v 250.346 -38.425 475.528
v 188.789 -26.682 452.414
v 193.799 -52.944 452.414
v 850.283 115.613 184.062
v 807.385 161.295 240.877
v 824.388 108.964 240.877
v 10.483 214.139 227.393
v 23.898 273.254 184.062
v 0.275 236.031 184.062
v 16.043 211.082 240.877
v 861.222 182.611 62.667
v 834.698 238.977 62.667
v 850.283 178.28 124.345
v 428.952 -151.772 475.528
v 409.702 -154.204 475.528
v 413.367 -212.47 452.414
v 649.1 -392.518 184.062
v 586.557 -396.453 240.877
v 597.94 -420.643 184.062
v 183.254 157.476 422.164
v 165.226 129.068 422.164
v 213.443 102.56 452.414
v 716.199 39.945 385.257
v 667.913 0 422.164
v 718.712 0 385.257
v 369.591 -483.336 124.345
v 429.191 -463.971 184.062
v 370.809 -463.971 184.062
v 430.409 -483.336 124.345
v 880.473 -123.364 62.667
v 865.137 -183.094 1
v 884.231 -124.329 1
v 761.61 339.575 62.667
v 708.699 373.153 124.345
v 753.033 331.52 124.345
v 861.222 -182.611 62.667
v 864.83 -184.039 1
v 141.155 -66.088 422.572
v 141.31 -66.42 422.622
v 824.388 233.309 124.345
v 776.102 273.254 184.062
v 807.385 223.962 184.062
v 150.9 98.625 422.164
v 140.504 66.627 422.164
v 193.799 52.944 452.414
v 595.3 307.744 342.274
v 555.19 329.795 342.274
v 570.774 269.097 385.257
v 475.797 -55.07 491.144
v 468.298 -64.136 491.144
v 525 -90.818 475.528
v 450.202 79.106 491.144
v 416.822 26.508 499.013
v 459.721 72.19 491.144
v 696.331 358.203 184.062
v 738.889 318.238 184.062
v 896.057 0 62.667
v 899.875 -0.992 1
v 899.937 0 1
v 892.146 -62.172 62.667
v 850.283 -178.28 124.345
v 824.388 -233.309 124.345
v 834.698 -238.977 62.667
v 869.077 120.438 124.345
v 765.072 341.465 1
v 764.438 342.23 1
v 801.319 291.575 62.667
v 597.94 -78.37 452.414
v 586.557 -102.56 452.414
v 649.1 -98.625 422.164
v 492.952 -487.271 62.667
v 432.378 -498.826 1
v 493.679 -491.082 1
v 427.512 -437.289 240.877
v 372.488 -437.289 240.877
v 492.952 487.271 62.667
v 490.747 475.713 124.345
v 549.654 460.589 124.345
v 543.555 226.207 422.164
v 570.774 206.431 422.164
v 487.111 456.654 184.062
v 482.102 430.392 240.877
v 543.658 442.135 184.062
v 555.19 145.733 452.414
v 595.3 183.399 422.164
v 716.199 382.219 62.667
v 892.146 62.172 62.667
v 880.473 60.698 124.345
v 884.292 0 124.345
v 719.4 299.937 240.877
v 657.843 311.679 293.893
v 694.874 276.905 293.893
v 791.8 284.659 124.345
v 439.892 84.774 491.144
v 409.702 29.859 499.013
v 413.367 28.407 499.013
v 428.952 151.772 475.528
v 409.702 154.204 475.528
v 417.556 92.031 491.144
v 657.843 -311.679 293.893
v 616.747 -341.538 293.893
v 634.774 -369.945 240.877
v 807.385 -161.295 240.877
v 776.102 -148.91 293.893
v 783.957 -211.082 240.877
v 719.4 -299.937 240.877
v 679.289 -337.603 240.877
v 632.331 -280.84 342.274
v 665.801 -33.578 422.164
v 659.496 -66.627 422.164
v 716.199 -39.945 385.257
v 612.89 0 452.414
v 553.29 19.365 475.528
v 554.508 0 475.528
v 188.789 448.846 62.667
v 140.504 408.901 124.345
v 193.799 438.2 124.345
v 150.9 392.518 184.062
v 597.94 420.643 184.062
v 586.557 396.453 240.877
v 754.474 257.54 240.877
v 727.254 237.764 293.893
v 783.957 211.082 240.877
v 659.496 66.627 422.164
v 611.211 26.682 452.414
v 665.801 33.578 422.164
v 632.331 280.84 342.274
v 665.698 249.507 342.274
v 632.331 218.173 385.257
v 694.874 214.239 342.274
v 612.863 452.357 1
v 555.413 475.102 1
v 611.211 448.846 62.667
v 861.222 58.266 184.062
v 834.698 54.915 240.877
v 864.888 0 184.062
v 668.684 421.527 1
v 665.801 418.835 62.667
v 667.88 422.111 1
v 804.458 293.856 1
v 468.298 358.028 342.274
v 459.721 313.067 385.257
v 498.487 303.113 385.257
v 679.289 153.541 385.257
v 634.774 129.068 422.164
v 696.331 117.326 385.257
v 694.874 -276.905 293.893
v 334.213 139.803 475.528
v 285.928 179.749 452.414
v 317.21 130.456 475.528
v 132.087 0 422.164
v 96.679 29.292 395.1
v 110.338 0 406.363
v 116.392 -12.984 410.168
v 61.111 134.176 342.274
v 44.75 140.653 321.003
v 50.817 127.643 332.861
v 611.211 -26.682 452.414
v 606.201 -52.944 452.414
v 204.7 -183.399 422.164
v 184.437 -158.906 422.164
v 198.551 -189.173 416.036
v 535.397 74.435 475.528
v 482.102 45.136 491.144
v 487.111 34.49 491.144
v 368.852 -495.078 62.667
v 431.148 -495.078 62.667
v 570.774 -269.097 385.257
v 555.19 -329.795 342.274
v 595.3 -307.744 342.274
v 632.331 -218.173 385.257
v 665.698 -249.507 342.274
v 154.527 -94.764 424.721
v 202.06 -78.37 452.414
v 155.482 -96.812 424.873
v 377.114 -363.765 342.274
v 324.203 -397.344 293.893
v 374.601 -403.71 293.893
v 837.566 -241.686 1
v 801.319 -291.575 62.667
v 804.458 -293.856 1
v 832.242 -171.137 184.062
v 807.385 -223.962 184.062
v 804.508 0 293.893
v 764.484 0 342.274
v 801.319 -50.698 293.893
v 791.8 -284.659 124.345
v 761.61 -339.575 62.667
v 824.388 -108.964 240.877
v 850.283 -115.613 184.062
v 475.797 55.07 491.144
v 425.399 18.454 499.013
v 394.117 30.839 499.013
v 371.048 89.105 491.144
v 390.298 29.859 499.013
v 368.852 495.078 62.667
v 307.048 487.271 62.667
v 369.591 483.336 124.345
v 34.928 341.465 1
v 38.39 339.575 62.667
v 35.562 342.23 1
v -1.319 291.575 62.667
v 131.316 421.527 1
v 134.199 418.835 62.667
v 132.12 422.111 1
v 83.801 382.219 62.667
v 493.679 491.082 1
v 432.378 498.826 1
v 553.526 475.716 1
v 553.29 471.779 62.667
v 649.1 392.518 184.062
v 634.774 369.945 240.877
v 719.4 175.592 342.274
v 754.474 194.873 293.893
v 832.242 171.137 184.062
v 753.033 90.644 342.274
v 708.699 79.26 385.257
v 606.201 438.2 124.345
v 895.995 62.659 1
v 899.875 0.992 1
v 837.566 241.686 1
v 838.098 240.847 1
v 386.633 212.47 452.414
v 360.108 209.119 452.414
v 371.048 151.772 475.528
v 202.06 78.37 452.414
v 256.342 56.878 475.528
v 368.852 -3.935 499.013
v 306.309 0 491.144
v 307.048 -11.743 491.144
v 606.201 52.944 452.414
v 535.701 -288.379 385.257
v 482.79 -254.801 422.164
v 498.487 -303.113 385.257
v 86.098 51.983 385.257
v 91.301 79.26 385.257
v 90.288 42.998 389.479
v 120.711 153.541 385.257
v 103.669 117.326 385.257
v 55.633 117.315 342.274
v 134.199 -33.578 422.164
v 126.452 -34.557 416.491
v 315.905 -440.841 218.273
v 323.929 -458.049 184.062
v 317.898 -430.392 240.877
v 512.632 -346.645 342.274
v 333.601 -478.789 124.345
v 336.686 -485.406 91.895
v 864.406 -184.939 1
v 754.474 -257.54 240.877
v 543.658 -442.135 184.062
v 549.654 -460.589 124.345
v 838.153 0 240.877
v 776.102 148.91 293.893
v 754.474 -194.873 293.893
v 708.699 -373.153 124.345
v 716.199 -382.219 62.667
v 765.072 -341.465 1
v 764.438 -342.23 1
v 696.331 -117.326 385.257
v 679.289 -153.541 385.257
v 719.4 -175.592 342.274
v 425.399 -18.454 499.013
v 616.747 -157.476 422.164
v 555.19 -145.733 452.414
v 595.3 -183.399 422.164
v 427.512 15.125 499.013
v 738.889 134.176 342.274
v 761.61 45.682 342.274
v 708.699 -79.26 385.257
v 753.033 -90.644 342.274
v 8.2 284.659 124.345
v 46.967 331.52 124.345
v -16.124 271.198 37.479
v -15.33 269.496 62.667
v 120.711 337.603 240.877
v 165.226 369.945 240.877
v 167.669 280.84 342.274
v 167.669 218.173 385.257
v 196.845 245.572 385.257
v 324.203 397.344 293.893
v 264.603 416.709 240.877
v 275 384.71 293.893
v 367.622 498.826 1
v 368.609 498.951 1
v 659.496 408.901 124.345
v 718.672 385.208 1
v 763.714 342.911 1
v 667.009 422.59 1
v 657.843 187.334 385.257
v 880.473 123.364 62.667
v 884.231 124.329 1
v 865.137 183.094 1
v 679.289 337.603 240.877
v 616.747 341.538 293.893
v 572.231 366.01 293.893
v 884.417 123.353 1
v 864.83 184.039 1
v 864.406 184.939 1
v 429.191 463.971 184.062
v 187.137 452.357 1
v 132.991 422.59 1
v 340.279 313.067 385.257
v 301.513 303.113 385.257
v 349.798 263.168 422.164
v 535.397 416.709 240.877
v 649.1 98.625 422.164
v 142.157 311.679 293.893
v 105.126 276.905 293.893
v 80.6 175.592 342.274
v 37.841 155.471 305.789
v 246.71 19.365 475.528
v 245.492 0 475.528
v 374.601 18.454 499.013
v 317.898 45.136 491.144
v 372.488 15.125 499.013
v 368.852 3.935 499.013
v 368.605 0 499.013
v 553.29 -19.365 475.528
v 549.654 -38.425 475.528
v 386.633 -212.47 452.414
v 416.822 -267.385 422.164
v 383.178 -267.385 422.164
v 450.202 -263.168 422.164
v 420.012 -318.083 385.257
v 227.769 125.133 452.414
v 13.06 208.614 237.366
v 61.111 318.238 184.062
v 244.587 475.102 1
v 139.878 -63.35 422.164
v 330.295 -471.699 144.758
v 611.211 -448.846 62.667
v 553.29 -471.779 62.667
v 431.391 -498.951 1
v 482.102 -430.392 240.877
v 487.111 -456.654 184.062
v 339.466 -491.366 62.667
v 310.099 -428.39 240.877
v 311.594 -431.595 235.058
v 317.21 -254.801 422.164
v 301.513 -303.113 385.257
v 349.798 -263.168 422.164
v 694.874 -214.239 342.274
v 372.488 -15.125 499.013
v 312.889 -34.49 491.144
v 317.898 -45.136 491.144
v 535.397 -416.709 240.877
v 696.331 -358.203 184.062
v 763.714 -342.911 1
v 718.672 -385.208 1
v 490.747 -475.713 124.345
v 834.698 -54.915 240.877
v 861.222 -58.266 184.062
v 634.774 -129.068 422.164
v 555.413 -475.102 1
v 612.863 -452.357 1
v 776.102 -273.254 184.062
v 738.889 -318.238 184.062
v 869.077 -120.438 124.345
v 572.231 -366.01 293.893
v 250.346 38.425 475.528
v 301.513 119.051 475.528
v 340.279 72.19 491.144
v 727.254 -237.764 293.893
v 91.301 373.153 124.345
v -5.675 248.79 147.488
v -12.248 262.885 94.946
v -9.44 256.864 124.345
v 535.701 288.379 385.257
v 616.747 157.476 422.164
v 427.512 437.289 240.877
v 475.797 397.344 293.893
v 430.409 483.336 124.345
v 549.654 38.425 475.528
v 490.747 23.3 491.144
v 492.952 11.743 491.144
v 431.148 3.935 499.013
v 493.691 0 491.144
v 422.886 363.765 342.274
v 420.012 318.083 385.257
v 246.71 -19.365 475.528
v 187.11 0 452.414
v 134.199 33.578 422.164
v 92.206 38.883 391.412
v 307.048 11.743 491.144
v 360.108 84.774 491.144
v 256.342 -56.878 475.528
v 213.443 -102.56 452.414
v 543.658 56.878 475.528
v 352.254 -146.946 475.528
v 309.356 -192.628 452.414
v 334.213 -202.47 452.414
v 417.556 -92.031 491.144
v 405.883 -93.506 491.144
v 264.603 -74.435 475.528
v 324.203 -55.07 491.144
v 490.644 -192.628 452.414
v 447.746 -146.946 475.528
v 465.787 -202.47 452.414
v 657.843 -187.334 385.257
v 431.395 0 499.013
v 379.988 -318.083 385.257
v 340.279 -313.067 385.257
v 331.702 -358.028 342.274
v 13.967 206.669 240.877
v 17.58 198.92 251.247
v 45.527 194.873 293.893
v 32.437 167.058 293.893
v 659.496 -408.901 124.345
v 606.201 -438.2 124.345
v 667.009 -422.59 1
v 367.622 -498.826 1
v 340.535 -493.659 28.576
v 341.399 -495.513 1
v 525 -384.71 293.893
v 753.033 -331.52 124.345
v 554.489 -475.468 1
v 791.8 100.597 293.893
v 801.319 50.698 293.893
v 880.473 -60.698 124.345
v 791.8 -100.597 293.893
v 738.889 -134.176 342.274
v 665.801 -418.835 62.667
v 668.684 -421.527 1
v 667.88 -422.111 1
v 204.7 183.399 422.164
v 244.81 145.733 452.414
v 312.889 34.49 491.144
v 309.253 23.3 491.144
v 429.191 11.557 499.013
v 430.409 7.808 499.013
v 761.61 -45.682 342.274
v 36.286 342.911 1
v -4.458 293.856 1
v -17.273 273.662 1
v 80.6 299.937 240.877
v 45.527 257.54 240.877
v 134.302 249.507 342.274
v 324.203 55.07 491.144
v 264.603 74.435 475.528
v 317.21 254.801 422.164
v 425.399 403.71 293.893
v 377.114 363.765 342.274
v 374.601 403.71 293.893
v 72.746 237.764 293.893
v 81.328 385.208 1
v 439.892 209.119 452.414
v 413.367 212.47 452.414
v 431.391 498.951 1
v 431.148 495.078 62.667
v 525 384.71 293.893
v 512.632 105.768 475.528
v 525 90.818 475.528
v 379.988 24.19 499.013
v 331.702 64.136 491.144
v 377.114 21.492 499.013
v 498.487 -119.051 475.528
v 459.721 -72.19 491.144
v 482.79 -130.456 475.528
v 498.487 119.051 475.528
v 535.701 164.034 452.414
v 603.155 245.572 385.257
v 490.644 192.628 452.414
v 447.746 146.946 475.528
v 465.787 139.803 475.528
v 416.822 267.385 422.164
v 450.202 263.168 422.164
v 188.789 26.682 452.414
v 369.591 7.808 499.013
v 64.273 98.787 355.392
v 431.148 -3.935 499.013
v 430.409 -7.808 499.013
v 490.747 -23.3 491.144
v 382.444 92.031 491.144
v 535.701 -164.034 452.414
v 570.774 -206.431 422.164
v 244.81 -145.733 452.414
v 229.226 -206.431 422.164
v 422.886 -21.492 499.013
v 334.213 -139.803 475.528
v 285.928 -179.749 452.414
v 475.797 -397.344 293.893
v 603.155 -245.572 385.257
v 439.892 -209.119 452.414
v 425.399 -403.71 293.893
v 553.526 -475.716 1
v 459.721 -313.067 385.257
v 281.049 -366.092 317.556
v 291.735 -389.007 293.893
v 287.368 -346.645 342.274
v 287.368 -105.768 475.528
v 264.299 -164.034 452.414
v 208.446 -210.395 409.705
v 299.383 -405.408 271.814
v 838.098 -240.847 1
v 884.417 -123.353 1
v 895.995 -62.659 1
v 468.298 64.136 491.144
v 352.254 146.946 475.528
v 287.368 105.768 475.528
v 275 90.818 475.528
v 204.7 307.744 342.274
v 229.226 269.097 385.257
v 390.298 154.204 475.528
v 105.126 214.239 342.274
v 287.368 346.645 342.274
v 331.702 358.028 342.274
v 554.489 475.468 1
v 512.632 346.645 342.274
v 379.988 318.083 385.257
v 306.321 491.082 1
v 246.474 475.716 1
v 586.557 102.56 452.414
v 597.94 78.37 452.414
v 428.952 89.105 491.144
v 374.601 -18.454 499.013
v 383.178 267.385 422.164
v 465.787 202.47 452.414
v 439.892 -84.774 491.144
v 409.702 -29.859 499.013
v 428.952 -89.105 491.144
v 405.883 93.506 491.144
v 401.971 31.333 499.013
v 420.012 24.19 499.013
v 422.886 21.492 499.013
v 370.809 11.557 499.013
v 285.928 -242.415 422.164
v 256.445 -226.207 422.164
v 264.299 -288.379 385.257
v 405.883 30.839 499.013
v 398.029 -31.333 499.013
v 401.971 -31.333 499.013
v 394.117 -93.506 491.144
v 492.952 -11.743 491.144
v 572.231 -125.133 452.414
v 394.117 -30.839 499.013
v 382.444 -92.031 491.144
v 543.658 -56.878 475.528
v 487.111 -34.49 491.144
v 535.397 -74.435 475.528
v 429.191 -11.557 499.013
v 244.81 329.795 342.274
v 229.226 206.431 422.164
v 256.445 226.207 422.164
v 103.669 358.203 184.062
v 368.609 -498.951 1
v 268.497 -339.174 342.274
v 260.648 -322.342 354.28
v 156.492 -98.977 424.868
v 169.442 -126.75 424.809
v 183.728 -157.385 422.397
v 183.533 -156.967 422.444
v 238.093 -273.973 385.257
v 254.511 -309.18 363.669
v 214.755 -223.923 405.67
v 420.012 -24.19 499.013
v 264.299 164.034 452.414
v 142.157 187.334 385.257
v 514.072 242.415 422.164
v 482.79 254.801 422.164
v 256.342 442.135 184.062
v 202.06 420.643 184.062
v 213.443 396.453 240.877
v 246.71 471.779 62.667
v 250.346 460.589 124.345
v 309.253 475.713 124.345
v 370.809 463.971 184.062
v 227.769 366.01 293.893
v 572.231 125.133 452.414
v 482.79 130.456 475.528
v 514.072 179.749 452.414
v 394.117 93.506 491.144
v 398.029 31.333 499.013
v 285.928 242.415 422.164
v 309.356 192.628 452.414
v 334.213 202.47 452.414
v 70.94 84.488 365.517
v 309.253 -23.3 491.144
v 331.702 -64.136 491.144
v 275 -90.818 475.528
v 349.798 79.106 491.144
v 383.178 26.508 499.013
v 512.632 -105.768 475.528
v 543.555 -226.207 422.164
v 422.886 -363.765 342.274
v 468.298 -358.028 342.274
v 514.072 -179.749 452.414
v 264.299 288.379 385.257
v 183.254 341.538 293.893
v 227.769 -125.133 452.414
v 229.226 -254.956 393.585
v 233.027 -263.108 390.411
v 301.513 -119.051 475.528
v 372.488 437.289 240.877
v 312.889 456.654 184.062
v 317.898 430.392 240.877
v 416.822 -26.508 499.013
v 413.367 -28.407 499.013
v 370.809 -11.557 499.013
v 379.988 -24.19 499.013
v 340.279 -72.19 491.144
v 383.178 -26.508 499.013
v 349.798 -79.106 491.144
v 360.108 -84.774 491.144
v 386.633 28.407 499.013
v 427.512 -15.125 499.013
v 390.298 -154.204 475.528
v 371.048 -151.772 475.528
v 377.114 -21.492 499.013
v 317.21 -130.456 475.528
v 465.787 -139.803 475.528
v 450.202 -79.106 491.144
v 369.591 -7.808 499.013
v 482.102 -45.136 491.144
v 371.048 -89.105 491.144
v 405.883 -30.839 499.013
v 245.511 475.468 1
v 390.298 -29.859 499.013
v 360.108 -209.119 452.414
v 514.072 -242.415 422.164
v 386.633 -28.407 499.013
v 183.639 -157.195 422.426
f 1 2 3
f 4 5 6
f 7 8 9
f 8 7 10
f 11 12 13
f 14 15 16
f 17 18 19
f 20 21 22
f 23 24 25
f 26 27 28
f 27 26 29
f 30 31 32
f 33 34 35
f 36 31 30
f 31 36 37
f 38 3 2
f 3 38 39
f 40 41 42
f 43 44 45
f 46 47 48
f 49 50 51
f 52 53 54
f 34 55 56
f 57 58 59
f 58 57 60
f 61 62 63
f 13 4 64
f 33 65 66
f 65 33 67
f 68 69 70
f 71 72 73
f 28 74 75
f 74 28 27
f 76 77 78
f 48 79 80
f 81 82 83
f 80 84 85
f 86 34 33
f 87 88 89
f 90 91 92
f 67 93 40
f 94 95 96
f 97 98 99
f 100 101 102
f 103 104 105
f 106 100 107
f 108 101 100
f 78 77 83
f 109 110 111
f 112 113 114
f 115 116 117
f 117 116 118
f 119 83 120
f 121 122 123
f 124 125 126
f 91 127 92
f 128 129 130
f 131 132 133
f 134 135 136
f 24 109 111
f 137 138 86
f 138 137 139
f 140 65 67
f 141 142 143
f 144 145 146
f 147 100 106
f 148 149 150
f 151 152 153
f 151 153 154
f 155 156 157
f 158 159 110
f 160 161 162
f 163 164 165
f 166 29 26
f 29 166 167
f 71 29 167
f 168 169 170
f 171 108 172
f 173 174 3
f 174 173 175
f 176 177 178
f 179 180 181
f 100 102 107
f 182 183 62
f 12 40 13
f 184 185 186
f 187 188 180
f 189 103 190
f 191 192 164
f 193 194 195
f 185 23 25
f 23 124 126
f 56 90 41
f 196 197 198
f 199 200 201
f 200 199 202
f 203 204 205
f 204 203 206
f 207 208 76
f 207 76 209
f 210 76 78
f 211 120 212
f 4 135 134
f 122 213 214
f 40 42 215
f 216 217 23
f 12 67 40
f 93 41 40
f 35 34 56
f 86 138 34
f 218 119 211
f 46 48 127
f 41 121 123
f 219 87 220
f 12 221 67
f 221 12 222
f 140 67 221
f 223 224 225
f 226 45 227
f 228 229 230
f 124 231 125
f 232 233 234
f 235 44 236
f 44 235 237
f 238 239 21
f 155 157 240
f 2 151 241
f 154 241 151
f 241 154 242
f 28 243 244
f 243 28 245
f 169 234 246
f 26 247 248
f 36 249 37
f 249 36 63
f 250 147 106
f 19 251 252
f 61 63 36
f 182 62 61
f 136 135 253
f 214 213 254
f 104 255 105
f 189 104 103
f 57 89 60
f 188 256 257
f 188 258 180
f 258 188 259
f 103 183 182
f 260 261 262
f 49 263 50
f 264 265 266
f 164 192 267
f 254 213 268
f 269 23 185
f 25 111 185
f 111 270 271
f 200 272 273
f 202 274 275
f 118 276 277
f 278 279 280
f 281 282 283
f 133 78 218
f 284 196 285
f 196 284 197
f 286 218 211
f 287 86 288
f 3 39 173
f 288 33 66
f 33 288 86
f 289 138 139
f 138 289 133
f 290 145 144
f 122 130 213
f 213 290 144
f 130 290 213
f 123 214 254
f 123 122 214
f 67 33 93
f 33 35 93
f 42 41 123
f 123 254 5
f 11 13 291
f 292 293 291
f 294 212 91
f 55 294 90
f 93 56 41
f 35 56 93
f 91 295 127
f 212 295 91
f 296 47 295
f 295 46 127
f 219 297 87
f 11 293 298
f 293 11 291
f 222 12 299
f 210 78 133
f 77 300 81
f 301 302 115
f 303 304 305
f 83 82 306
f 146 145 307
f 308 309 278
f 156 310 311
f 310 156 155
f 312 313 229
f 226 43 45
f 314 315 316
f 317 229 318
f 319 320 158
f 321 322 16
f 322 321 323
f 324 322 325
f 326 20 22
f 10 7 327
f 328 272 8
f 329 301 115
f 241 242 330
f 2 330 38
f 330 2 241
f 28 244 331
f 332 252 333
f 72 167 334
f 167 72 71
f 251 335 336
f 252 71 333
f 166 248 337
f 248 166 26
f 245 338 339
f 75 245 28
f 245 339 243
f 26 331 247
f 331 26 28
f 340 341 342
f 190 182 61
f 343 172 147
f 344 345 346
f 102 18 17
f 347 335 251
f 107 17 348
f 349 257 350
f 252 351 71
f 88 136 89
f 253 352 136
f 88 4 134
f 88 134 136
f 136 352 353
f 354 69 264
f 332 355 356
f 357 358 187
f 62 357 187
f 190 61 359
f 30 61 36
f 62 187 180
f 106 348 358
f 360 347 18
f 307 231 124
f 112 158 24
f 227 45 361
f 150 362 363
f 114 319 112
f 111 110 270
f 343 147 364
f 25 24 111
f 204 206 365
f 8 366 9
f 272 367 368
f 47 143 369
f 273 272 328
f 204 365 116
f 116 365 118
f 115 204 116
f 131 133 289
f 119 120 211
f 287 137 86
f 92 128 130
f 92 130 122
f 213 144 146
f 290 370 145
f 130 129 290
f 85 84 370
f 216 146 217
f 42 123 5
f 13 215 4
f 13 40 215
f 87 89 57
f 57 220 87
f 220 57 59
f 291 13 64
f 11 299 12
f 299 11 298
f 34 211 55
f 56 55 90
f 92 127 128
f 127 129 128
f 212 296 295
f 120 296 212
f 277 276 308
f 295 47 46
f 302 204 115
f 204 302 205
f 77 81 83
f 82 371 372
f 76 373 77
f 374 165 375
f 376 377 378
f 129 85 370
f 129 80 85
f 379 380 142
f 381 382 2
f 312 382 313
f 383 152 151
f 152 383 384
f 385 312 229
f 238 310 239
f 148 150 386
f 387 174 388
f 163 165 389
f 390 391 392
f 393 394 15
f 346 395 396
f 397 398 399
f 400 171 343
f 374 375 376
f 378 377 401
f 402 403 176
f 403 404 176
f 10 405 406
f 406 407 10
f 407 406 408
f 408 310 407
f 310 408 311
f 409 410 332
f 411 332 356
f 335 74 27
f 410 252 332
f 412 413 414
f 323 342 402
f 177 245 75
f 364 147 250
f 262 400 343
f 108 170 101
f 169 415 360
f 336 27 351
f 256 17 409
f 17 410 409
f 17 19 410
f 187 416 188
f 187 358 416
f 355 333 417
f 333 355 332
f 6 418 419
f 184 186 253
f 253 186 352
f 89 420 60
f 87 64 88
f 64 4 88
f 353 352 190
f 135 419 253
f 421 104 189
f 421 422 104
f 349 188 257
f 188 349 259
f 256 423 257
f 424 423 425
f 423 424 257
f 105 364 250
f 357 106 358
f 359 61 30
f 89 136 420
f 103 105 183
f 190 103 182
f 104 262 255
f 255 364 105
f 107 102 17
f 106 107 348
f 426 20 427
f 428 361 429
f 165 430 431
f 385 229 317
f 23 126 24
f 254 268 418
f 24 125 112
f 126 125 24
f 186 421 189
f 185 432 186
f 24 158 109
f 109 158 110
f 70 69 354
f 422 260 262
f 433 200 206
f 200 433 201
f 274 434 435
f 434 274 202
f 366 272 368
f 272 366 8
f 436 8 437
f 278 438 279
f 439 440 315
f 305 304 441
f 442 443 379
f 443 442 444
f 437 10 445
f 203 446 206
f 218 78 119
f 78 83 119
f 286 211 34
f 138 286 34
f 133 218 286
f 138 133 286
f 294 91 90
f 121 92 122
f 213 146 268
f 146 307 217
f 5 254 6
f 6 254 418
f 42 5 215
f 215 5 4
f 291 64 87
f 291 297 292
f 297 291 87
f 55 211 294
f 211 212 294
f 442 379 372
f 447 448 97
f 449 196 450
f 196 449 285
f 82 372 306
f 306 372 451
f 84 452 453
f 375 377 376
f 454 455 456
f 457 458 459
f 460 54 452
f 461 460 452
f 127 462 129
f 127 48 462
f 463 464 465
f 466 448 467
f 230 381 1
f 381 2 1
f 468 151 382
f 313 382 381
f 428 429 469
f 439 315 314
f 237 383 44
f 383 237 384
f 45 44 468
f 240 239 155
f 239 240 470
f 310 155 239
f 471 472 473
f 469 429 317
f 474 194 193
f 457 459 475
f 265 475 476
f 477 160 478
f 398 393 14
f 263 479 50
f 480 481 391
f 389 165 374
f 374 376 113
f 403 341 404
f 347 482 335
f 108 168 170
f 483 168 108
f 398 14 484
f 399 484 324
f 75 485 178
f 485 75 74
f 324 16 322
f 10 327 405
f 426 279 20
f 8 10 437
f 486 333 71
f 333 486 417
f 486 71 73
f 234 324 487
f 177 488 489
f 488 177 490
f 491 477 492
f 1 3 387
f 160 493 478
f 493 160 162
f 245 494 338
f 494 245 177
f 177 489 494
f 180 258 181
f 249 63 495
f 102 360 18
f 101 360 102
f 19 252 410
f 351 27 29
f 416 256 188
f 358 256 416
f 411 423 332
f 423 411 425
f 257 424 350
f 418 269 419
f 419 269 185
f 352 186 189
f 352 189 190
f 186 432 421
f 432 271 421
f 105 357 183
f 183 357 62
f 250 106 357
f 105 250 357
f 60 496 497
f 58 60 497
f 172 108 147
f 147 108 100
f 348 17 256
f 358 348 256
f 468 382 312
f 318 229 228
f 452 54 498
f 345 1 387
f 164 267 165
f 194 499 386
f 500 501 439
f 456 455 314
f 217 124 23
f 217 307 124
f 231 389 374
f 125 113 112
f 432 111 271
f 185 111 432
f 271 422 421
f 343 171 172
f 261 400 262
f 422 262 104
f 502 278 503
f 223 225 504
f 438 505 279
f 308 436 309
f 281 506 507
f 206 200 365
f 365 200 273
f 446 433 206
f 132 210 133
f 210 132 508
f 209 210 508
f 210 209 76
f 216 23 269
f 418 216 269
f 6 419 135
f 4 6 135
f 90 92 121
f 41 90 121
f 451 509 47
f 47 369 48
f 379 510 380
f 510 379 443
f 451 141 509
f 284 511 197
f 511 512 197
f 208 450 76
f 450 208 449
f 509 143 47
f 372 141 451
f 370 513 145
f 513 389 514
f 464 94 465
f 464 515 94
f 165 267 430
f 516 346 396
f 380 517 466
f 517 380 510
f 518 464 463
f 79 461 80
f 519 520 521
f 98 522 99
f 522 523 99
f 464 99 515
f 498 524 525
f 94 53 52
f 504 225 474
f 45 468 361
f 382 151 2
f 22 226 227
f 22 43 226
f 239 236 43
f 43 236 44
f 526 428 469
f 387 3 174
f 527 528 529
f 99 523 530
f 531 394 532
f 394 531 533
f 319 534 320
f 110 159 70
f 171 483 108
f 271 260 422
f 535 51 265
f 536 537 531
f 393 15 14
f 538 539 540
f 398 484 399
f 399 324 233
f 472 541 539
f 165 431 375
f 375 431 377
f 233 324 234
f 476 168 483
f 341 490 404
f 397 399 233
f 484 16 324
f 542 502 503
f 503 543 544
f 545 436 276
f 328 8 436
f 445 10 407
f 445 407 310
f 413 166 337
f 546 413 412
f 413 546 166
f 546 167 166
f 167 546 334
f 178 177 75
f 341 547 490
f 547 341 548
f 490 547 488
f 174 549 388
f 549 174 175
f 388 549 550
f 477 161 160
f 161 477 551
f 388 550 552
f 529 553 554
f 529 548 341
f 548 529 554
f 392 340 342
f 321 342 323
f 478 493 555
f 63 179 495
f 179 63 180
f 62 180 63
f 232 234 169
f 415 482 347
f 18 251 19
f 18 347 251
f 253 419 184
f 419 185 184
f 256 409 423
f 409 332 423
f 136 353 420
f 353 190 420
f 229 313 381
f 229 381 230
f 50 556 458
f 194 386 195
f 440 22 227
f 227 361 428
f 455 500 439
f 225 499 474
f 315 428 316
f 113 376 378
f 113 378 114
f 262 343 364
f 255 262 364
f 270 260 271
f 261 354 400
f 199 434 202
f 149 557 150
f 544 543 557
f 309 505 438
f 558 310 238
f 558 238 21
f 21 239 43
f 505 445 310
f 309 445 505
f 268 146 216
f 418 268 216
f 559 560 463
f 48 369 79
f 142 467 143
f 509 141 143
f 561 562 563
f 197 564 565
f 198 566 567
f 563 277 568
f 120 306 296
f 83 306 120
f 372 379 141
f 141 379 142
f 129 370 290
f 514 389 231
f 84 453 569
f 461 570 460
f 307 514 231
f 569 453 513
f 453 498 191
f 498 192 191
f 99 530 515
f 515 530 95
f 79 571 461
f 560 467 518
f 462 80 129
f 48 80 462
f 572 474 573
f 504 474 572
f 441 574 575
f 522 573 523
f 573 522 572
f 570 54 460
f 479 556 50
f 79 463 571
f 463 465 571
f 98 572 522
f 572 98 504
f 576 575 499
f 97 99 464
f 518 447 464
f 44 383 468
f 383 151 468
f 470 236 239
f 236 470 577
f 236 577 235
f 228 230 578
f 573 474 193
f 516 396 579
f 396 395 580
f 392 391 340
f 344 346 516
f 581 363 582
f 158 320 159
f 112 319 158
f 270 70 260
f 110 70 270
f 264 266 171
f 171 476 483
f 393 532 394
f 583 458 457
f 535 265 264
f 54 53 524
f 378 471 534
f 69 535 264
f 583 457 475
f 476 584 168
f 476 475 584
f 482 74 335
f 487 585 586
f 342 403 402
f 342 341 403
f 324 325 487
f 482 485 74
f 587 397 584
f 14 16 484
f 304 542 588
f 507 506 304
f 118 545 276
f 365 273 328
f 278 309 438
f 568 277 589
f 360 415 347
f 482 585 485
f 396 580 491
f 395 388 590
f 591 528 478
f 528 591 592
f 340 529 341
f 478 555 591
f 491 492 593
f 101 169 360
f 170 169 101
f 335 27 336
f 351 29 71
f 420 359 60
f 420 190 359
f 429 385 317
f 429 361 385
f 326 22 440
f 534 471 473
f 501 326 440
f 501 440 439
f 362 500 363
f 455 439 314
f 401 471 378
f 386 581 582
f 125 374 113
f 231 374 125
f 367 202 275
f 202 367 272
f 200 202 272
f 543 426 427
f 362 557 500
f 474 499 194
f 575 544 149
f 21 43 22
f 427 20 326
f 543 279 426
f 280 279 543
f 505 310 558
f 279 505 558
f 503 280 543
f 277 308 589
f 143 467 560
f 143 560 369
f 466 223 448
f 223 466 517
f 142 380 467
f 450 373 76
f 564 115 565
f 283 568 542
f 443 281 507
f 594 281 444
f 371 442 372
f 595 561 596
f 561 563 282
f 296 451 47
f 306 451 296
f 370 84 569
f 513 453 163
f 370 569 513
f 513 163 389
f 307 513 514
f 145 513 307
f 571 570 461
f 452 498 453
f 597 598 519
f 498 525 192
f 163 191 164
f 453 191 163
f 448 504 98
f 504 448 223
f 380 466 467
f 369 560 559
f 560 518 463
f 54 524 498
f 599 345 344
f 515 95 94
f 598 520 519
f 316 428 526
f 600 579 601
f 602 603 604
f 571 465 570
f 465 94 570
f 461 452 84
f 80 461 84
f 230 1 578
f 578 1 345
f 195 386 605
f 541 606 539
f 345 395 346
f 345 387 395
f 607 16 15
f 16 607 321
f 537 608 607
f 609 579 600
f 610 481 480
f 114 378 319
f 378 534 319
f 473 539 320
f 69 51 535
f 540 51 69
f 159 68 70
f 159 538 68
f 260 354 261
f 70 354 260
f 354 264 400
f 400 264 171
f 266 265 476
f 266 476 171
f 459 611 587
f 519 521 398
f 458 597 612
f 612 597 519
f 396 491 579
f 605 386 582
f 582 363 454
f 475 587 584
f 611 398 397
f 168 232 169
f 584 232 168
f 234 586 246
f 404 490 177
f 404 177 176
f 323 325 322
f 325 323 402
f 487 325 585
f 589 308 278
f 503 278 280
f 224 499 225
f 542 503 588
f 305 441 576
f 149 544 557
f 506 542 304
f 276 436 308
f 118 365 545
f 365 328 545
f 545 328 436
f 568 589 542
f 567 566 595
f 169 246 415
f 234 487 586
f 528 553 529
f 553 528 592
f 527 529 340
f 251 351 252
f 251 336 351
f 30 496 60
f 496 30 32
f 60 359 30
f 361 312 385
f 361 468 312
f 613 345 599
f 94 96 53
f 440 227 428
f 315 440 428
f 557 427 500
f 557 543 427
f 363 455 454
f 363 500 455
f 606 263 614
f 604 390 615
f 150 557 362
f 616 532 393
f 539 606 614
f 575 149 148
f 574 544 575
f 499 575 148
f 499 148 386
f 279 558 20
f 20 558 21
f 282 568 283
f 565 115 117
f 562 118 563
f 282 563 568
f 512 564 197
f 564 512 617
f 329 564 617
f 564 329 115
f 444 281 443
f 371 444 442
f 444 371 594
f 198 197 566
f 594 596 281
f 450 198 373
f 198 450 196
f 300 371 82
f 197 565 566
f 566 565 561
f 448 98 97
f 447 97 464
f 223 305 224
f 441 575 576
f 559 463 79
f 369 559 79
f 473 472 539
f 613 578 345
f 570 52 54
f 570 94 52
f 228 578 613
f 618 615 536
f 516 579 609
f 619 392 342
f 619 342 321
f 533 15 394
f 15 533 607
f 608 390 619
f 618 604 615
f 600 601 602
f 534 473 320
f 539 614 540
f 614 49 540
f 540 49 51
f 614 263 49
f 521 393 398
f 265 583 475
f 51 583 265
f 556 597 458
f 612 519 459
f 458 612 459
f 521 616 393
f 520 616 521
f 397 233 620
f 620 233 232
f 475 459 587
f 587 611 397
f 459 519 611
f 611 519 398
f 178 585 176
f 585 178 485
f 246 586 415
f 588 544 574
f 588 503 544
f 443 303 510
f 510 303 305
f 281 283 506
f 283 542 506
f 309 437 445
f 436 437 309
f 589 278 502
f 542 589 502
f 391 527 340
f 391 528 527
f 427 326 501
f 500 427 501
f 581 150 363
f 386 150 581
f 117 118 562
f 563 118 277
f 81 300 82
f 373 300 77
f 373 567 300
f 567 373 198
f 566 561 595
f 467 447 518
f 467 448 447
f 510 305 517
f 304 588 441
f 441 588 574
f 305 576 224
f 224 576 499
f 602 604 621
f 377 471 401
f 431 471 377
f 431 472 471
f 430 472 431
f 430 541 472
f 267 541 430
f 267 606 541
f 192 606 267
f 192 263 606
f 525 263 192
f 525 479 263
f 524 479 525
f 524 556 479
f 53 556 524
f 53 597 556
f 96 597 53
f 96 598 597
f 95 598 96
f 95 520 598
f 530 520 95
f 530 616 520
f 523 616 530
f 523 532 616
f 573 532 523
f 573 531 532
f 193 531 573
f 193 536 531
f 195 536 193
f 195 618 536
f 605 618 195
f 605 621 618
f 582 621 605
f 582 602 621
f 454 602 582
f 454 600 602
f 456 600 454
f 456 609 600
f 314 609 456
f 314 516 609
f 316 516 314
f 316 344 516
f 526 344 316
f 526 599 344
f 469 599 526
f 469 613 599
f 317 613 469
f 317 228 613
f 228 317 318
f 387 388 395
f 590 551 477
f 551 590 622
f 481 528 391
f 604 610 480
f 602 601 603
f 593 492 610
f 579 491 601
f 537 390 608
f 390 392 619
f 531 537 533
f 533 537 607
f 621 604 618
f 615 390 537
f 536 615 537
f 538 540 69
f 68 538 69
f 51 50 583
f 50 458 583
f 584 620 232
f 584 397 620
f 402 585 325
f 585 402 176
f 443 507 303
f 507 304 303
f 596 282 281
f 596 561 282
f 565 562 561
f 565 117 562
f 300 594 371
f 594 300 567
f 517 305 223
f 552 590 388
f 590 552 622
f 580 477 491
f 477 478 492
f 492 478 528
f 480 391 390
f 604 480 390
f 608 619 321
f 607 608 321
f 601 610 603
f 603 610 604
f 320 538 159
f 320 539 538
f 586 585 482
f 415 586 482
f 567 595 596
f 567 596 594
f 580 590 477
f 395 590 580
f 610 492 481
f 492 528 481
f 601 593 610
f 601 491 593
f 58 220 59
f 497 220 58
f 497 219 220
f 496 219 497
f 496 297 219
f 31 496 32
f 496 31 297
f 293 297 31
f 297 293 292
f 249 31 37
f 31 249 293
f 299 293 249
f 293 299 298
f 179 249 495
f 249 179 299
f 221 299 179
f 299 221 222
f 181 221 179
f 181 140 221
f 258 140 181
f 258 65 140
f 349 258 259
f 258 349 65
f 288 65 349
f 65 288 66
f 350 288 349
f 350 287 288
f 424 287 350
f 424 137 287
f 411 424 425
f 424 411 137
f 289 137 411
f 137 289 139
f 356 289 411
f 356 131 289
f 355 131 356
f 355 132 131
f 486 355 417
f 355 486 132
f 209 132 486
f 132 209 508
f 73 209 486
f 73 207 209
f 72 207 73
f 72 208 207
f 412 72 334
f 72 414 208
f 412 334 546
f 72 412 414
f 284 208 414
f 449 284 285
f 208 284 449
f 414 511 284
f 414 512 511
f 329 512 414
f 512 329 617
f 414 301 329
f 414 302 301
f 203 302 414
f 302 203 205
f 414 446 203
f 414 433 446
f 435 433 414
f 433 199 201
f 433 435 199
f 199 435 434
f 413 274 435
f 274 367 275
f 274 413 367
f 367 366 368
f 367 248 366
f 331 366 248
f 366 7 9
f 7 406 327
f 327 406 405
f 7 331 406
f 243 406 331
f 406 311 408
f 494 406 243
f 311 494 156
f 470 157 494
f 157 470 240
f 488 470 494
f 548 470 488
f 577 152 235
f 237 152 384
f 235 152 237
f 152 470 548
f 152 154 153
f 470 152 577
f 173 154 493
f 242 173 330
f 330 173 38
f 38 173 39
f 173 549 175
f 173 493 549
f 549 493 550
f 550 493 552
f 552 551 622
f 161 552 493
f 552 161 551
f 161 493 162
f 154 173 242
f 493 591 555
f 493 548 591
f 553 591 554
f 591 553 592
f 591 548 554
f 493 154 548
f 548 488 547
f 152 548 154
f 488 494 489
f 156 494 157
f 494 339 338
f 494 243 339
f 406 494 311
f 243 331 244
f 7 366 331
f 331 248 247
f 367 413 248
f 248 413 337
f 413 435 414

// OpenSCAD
R = 400;
L = 500;
I = 1000;
difference() 
{
	difference()
	{
	translate([R,0,0])	sphere(r=L,$fn=50);
	{translate([-I,-I,-I+1]) cube ([2*I,2*I,I]);};
	}
	rotate(a=25)
	{
		translate([-10*L+100,-10*L,0])
		{
			cube([10*L,20*L,L]);
		}
	}
 }
